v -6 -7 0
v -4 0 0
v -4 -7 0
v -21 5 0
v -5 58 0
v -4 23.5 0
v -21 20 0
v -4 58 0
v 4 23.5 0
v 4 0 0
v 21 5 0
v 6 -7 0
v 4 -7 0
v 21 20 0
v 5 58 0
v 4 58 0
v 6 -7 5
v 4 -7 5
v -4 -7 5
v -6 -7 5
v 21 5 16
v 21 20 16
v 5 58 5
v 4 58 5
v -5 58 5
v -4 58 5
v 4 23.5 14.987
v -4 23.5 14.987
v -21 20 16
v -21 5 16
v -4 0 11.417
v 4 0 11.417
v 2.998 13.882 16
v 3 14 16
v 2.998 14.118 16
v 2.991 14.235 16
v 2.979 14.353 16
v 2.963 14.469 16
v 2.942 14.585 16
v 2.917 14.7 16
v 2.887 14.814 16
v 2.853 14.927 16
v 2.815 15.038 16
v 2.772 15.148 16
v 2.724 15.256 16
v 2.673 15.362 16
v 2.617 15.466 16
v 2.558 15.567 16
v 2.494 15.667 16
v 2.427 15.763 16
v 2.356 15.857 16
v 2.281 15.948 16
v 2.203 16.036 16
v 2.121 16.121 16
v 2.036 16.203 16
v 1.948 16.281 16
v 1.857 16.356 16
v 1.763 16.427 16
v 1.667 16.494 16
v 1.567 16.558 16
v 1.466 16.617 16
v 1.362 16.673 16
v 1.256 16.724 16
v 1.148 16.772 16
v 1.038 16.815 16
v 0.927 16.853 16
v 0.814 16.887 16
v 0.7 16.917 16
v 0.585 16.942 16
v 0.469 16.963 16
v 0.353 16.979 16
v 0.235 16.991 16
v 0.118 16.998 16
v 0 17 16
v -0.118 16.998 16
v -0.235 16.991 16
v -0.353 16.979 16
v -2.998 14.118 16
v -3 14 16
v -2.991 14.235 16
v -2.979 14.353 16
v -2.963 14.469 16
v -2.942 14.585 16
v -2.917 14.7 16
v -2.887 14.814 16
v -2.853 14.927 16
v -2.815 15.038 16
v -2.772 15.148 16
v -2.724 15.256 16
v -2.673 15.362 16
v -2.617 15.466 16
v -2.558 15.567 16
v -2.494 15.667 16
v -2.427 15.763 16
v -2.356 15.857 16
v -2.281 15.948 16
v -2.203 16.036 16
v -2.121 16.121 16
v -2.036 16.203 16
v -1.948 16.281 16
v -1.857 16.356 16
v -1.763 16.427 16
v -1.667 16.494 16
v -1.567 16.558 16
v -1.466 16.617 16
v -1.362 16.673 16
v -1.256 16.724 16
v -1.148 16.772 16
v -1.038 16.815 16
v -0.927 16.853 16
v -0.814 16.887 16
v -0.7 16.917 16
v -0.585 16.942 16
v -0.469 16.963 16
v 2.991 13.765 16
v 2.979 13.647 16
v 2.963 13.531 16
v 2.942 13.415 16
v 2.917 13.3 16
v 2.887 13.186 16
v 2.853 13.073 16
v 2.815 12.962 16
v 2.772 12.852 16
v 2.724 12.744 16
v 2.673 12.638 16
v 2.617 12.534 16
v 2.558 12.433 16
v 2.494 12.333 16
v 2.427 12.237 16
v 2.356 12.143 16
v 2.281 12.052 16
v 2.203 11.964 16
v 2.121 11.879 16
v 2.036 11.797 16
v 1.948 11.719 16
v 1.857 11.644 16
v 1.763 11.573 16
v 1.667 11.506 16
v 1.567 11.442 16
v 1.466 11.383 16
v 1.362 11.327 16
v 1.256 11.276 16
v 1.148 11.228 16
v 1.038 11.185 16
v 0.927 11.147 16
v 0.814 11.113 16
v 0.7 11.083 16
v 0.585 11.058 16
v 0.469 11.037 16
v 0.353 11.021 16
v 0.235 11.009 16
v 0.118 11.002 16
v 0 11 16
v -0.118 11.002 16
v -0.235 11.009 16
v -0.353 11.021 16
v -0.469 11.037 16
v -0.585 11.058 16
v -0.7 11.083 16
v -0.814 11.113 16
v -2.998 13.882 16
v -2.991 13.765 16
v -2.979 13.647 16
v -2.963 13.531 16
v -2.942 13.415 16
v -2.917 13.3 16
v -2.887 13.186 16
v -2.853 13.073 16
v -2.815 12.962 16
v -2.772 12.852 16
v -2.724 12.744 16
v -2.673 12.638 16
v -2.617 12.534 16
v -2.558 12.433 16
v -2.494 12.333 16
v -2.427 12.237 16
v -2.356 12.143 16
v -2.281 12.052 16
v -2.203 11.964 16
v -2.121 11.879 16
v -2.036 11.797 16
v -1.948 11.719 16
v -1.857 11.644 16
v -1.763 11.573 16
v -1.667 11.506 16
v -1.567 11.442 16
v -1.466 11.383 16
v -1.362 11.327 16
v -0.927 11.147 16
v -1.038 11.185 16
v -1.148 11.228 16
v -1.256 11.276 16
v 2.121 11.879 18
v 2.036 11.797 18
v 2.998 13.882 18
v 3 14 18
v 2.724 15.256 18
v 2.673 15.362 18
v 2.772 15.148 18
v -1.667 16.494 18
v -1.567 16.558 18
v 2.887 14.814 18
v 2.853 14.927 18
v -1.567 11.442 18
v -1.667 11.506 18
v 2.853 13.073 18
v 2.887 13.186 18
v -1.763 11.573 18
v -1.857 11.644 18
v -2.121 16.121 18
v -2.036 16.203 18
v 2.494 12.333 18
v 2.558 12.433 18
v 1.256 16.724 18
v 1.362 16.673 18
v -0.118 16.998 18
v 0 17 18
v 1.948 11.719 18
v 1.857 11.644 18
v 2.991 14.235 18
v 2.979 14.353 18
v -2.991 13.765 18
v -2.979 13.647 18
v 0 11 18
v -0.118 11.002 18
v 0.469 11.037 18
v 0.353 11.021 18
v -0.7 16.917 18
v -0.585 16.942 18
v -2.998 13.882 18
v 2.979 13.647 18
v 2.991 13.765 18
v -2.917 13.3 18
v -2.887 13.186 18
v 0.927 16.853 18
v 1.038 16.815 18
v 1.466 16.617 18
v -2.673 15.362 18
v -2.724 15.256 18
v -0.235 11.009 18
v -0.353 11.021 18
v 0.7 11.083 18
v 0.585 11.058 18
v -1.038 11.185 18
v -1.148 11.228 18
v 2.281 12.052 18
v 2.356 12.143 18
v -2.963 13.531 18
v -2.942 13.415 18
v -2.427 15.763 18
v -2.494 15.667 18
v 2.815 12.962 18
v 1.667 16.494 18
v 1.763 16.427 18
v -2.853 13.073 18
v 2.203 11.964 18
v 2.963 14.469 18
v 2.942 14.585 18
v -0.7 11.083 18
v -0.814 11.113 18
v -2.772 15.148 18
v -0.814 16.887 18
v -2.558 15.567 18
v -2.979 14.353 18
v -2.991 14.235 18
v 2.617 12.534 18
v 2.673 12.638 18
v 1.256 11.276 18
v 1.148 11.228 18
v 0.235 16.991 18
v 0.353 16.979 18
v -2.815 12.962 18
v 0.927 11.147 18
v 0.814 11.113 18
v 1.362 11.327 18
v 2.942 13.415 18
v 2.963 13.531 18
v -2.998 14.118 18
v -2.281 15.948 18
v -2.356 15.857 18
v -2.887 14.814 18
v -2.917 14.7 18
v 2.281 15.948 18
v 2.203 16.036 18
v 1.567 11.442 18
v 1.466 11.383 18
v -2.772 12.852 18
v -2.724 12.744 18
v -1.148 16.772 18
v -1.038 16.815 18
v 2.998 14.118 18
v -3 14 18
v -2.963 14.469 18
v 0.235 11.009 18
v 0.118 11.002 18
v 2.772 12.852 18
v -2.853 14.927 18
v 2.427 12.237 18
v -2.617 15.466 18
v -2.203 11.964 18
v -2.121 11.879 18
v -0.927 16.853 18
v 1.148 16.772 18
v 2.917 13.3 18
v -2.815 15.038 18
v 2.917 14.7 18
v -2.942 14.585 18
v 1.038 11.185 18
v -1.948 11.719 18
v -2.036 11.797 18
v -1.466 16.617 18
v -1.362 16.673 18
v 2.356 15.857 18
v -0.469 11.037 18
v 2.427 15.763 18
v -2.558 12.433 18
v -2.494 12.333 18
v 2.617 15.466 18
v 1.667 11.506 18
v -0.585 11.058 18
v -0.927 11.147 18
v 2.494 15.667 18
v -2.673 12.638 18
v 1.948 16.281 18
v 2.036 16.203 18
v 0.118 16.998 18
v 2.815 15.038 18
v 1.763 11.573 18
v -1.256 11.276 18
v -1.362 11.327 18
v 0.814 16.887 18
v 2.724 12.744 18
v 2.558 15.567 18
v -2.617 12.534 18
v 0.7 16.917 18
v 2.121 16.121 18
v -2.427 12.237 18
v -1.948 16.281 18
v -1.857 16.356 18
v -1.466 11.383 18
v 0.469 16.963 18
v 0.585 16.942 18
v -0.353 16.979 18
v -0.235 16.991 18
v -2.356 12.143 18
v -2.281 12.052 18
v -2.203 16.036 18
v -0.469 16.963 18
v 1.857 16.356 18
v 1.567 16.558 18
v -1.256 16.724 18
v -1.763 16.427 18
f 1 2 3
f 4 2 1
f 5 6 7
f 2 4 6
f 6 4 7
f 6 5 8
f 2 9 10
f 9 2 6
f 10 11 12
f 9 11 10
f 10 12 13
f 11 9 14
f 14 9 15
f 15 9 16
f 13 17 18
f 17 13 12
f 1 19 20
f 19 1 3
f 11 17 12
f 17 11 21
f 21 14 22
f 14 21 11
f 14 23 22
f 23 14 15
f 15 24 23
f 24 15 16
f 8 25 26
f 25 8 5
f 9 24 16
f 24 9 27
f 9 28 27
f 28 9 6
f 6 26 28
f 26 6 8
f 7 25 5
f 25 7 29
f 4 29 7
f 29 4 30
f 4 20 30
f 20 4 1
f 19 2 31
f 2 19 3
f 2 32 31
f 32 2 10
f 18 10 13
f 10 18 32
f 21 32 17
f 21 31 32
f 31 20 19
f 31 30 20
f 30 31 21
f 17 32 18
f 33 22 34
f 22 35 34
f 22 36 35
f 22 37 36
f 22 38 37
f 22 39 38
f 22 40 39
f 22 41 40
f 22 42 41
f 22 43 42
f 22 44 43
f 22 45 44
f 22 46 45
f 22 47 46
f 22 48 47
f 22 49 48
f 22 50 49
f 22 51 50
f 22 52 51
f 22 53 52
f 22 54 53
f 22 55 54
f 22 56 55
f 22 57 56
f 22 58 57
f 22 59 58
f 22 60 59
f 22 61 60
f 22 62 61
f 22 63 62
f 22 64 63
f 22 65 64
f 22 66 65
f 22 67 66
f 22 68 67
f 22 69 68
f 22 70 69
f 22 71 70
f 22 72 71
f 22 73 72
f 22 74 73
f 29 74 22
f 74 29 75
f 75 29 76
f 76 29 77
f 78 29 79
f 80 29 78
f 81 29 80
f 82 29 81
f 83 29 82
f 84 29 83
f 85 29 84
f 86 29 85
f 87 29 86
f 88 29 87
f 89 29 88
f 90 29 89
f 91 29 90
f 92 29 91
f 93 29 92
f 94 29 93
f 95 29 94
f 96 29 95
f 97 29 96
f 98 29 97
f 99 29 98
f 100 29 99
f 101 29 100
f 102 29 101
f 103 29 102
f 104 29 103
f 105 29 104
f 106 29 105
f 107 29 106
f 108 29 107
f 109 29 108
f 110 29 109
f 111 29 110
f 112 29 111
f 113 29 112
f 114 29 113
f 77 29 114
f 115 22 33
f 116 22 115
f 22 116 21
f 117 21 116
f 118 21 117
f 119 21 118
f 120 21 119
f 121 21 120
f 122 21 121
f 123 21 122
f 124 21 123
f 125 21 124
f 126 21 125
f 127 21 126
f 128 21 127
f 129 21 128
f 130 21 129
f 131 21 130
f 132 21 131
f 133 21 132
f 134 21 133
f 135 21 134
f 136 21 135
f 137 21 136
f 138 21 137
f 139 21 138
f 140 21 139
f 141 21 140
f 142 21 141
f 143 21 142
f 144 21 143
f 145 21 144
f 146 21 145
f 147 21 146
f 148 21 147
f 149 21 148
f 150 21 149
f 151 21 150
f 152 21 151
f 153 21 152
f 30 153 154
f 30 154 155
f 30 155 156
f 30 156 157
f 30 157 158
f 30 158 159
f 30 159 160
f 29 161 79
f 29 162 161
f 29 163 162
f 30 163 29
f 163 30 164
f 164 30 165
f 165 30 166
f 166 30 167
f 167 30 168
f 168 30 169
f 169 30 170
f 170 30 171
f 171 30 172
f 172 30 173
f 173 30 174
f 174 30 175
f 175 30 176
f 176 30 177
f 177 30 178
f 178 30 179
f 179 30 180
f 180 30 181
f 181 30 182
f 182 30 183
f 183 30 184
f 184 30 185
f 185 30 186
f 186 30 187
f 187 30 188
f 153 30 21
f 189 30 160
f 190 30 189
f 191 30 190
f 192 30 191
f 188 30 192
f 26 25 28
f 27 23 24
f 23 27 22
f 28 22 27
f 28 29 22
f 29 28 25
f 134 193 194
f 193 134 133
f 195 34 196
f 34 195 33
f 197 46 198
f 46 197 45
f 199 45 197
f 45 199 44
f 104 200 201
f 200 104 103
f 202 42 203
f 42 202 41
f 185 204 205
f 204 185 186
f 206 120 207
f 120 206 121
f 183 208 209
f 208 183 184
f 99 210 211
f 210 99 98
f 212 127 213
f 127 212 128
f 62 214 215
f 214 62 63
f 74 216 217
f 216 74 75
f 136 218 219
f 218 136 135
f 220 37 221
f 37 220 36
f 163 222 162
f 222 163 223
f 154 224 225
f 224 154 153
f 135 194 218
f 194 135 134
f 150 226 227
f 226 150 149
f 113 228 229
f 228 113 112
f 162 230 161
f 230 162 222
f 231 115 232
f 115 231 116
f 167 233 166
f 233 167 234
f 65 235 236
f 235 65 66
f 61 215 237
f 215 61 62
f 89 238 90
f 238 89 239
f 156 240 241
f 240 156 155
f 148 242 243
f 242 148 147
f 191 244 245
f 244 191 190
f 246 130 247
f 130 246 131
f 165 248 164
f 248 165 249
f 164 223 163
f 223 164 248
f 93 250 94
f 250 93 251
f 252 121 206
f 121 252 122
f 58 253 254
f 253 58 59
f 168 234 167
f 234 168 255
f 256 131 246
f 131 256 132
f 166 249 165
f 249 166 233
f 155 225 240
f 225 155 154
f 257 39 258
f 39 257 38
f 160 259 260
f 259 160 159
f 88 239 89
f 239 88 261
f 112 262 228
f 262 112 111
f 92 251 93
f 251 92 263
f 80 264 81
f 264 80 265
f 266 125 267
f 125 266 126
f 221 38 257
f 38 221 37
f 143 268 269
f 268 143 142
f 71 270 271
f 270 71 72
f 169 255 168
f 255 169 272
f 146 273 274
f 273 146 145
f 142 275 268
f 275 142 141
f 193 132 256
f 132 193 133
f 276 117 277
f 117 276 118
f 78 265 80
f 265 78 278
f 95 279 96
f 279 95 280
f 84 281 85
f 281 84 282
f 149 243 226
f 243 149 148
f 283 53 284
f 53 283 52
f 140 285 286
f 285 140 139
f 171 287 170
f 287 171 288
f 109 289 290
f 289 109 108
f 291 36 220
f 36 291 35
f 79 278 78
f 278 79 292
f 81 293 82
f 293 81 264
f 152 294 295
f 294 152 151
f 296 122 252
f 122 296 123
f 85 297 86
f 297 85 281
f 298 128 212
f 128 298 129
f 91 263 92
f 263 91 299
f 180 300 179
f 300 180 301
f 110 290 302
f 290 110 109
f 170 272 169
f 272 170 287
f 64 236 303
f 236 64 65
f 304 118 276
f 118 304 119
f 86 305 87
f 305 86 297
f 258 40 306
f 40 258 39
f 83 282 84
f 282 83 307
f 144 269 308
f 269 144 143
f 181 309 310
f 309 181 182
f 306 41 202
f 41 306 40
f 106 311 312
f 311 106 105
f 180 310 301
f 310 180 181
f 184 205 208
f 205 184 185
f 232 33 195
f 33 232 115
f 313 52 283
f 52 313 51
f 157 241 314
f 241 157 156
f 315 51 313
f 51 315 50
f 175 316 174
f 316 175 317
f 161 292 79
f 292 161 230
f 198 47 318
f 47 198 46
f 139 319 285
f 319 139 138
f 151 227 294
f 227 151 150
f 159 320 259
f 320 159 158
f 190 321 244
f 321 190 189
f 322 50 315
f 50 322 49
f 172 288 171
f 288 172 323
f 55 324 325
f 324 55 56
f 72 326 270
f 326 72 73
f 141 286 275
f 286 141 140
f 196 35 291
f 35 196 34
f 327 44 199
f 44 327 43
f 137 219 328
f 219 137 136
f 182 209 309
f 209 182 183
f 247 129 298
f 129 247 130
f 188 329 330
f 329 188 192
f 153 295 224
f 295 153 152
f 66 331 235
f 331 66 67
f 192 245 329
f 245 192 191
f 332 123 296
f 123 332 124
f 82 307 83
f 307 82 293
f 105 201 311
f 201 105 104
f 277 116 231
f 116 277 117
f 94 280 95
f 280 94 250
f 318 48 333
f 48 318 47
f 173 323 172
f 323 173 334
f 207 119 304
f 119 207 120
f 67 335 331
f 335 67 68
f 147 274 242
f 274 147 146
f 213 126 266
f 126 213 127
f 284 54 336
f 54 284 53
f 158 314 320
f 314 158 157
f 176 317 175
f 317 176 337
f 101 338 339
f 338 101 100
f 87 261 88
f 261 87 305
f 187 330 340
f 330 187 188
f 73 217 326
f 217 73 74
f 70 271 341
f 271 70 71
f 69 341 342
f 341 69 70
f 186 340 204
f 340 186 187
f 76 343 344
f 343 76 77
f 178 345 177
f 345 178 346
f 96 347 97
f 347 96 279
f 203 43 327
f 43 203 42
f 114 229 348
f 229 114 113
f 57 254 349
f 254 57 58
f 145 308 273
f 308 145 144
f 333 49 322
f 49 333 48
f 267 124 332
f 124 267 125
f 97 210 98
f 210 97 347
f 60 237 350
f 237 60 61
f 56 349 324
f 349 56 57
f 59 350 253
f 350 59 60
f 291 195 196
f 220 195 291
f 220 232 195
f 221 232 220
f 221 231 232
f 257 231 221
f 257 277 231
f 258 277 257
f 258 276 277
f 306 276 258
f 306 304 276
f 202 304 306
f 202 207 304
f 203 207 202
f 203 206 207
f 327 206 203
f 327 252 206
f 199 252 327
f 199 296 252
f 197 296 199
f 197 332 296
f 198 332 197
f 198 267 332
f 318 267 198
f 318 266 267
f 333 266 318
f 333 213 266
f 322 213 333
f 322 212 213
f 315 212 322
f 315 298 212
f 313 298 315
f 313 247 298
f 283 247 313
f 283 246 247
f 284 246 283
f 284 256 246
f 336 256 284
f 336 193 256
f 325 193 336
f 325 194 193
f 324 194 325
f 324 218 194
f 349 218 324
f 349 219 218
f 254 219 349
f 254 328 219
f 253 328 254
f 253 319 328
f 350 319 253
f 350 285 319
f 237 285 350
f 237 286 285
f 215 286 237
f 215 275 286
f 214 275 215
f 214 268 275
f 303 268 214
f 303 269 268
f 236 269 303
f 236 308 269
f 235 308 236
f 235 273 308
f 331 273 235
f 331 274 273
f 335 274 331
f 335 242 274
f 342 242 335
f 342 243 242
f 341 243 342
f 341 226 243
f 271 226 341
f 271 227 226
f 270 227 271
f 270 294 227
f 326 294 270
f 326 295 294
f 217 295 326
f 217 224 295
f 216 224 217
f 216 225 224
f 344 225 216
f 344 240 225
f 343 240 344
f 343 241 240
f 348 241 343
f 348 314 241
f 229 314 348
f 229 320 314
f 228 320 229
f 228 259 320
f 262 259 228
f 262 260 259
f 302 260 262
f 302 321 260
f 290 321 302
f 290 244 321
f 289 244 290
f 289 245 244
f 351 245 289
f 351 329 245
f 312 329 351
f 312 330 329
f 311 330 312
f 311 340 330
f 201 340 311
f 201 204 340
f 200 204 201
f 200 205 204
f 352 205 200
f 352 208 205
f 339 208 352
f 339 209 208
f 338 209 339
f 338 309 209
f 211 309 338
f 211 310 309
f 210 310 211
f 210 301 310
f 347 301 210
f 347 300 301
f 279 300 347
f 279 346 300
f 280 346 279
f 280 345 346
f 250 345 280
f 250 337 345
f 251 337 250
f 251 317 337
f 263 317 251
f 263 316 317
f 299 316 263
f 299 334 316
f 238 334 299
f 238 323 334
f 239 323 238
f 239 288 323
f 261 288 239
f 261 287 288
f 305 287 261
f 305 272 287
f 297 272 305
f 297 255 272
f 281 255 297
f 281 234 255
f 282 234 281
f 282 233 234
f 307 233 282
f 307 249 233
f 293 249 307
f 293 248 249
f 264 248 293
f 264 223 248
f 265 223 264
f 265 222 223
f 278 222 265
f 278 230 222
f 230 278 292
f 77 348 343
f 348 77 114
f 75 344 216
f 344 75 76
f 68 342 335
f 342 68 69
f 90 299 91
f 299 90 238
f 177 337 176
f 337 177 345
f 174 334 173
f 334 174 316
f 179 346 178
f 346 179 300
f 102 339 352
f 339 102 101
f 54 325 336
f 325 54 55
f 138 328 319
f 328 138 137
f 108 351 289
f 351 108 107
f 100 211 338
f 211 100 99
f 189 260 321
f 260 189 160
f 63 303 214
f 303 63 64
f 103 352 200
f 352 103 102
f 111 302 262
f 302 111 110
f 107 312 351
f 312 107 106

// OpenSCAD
/* tie-striker-bin.scad
 *
 * Copyright (C) Robert B. Ross, 2017
 *
 * This software is released under the Creative Commons
 * Attribution-ShareAlike 4.0 International Public License.
 */

include <./bintools.scad>

$fn=160;
binHeight = 46.5/2;
blankHeight = 18.0; // this is the height of the region supporting ship
   

/* locations is a pair of triples, translate : rotate pairs
 */
sLocations = [[[2.25,-29,0], [0,0,23]]];
// sLocations = [[[0,-31,0], [0,0,0]]];

// harborFreightMediumHalfHt(sLocations,inset=1,bottomThick=0.9) sBlank();

sBlank();
// sOutline();

/* sOutline() -- test piece for outline
 */
module sOutline() {
   translate([0,0,14.9]) rotate([180,0,0]) {
      blankCutout(height=15 - 0.1, outlineScale=1.2) sBlank();
   }
}

module sBlank(centerCutout=1, useProfile=1) {
   /* rotate, etc. positions blank upside-down on XY plane */
   union() {
      translate([0,0,0]) intersection() {
         linear_extrude(height=blankHeight) sShell();
         if (useProfile) sProfile(s=blankHeight);
      }

      /* I only want the peg to just sit flush in this case */
      if (centerCutout) linear_extrude(height=18) sCutoutPoly();
   } /* rotate, translate, union */
}

/* sShell() -- exterior outline */
module sShell() {
   for (j=[0:1]) mirror([j,0,0])
      polygon(points=[[0,0], [4,0], [4,-7], [6,-7], [21,5], [21,20], [5,58],
                      [4,58], [4,23.5], [0,23.5]]);
}

/* sProfile() - defines the side profile of the blank (not cutout)
 */
module sProfile(w=200)
{
   translate([-1*w/2,0,0]) rotate([90,0,90]) linear_extrude(height=w) {
      polygon(points=[
                     [-7,0], [-7,5], [5,16], [20,16], [58,5], [58,0]
                     ]);
   }

}

/* sCutoutPoly() -- defines a polygon to be cut all the way to the
 *                     bottom of the bin.
 *
 */
module sCutoutPoly() {
   translate([0,21-7,0]) circle(r=3);
}

/*
 * Local variables:
 *  mode: C
 *  c-indent-level: 3
 *  c-basic-offset: 3
 * End:
 *
 * vim: ts=8 sts=3 sw=3 expandtab
 */
